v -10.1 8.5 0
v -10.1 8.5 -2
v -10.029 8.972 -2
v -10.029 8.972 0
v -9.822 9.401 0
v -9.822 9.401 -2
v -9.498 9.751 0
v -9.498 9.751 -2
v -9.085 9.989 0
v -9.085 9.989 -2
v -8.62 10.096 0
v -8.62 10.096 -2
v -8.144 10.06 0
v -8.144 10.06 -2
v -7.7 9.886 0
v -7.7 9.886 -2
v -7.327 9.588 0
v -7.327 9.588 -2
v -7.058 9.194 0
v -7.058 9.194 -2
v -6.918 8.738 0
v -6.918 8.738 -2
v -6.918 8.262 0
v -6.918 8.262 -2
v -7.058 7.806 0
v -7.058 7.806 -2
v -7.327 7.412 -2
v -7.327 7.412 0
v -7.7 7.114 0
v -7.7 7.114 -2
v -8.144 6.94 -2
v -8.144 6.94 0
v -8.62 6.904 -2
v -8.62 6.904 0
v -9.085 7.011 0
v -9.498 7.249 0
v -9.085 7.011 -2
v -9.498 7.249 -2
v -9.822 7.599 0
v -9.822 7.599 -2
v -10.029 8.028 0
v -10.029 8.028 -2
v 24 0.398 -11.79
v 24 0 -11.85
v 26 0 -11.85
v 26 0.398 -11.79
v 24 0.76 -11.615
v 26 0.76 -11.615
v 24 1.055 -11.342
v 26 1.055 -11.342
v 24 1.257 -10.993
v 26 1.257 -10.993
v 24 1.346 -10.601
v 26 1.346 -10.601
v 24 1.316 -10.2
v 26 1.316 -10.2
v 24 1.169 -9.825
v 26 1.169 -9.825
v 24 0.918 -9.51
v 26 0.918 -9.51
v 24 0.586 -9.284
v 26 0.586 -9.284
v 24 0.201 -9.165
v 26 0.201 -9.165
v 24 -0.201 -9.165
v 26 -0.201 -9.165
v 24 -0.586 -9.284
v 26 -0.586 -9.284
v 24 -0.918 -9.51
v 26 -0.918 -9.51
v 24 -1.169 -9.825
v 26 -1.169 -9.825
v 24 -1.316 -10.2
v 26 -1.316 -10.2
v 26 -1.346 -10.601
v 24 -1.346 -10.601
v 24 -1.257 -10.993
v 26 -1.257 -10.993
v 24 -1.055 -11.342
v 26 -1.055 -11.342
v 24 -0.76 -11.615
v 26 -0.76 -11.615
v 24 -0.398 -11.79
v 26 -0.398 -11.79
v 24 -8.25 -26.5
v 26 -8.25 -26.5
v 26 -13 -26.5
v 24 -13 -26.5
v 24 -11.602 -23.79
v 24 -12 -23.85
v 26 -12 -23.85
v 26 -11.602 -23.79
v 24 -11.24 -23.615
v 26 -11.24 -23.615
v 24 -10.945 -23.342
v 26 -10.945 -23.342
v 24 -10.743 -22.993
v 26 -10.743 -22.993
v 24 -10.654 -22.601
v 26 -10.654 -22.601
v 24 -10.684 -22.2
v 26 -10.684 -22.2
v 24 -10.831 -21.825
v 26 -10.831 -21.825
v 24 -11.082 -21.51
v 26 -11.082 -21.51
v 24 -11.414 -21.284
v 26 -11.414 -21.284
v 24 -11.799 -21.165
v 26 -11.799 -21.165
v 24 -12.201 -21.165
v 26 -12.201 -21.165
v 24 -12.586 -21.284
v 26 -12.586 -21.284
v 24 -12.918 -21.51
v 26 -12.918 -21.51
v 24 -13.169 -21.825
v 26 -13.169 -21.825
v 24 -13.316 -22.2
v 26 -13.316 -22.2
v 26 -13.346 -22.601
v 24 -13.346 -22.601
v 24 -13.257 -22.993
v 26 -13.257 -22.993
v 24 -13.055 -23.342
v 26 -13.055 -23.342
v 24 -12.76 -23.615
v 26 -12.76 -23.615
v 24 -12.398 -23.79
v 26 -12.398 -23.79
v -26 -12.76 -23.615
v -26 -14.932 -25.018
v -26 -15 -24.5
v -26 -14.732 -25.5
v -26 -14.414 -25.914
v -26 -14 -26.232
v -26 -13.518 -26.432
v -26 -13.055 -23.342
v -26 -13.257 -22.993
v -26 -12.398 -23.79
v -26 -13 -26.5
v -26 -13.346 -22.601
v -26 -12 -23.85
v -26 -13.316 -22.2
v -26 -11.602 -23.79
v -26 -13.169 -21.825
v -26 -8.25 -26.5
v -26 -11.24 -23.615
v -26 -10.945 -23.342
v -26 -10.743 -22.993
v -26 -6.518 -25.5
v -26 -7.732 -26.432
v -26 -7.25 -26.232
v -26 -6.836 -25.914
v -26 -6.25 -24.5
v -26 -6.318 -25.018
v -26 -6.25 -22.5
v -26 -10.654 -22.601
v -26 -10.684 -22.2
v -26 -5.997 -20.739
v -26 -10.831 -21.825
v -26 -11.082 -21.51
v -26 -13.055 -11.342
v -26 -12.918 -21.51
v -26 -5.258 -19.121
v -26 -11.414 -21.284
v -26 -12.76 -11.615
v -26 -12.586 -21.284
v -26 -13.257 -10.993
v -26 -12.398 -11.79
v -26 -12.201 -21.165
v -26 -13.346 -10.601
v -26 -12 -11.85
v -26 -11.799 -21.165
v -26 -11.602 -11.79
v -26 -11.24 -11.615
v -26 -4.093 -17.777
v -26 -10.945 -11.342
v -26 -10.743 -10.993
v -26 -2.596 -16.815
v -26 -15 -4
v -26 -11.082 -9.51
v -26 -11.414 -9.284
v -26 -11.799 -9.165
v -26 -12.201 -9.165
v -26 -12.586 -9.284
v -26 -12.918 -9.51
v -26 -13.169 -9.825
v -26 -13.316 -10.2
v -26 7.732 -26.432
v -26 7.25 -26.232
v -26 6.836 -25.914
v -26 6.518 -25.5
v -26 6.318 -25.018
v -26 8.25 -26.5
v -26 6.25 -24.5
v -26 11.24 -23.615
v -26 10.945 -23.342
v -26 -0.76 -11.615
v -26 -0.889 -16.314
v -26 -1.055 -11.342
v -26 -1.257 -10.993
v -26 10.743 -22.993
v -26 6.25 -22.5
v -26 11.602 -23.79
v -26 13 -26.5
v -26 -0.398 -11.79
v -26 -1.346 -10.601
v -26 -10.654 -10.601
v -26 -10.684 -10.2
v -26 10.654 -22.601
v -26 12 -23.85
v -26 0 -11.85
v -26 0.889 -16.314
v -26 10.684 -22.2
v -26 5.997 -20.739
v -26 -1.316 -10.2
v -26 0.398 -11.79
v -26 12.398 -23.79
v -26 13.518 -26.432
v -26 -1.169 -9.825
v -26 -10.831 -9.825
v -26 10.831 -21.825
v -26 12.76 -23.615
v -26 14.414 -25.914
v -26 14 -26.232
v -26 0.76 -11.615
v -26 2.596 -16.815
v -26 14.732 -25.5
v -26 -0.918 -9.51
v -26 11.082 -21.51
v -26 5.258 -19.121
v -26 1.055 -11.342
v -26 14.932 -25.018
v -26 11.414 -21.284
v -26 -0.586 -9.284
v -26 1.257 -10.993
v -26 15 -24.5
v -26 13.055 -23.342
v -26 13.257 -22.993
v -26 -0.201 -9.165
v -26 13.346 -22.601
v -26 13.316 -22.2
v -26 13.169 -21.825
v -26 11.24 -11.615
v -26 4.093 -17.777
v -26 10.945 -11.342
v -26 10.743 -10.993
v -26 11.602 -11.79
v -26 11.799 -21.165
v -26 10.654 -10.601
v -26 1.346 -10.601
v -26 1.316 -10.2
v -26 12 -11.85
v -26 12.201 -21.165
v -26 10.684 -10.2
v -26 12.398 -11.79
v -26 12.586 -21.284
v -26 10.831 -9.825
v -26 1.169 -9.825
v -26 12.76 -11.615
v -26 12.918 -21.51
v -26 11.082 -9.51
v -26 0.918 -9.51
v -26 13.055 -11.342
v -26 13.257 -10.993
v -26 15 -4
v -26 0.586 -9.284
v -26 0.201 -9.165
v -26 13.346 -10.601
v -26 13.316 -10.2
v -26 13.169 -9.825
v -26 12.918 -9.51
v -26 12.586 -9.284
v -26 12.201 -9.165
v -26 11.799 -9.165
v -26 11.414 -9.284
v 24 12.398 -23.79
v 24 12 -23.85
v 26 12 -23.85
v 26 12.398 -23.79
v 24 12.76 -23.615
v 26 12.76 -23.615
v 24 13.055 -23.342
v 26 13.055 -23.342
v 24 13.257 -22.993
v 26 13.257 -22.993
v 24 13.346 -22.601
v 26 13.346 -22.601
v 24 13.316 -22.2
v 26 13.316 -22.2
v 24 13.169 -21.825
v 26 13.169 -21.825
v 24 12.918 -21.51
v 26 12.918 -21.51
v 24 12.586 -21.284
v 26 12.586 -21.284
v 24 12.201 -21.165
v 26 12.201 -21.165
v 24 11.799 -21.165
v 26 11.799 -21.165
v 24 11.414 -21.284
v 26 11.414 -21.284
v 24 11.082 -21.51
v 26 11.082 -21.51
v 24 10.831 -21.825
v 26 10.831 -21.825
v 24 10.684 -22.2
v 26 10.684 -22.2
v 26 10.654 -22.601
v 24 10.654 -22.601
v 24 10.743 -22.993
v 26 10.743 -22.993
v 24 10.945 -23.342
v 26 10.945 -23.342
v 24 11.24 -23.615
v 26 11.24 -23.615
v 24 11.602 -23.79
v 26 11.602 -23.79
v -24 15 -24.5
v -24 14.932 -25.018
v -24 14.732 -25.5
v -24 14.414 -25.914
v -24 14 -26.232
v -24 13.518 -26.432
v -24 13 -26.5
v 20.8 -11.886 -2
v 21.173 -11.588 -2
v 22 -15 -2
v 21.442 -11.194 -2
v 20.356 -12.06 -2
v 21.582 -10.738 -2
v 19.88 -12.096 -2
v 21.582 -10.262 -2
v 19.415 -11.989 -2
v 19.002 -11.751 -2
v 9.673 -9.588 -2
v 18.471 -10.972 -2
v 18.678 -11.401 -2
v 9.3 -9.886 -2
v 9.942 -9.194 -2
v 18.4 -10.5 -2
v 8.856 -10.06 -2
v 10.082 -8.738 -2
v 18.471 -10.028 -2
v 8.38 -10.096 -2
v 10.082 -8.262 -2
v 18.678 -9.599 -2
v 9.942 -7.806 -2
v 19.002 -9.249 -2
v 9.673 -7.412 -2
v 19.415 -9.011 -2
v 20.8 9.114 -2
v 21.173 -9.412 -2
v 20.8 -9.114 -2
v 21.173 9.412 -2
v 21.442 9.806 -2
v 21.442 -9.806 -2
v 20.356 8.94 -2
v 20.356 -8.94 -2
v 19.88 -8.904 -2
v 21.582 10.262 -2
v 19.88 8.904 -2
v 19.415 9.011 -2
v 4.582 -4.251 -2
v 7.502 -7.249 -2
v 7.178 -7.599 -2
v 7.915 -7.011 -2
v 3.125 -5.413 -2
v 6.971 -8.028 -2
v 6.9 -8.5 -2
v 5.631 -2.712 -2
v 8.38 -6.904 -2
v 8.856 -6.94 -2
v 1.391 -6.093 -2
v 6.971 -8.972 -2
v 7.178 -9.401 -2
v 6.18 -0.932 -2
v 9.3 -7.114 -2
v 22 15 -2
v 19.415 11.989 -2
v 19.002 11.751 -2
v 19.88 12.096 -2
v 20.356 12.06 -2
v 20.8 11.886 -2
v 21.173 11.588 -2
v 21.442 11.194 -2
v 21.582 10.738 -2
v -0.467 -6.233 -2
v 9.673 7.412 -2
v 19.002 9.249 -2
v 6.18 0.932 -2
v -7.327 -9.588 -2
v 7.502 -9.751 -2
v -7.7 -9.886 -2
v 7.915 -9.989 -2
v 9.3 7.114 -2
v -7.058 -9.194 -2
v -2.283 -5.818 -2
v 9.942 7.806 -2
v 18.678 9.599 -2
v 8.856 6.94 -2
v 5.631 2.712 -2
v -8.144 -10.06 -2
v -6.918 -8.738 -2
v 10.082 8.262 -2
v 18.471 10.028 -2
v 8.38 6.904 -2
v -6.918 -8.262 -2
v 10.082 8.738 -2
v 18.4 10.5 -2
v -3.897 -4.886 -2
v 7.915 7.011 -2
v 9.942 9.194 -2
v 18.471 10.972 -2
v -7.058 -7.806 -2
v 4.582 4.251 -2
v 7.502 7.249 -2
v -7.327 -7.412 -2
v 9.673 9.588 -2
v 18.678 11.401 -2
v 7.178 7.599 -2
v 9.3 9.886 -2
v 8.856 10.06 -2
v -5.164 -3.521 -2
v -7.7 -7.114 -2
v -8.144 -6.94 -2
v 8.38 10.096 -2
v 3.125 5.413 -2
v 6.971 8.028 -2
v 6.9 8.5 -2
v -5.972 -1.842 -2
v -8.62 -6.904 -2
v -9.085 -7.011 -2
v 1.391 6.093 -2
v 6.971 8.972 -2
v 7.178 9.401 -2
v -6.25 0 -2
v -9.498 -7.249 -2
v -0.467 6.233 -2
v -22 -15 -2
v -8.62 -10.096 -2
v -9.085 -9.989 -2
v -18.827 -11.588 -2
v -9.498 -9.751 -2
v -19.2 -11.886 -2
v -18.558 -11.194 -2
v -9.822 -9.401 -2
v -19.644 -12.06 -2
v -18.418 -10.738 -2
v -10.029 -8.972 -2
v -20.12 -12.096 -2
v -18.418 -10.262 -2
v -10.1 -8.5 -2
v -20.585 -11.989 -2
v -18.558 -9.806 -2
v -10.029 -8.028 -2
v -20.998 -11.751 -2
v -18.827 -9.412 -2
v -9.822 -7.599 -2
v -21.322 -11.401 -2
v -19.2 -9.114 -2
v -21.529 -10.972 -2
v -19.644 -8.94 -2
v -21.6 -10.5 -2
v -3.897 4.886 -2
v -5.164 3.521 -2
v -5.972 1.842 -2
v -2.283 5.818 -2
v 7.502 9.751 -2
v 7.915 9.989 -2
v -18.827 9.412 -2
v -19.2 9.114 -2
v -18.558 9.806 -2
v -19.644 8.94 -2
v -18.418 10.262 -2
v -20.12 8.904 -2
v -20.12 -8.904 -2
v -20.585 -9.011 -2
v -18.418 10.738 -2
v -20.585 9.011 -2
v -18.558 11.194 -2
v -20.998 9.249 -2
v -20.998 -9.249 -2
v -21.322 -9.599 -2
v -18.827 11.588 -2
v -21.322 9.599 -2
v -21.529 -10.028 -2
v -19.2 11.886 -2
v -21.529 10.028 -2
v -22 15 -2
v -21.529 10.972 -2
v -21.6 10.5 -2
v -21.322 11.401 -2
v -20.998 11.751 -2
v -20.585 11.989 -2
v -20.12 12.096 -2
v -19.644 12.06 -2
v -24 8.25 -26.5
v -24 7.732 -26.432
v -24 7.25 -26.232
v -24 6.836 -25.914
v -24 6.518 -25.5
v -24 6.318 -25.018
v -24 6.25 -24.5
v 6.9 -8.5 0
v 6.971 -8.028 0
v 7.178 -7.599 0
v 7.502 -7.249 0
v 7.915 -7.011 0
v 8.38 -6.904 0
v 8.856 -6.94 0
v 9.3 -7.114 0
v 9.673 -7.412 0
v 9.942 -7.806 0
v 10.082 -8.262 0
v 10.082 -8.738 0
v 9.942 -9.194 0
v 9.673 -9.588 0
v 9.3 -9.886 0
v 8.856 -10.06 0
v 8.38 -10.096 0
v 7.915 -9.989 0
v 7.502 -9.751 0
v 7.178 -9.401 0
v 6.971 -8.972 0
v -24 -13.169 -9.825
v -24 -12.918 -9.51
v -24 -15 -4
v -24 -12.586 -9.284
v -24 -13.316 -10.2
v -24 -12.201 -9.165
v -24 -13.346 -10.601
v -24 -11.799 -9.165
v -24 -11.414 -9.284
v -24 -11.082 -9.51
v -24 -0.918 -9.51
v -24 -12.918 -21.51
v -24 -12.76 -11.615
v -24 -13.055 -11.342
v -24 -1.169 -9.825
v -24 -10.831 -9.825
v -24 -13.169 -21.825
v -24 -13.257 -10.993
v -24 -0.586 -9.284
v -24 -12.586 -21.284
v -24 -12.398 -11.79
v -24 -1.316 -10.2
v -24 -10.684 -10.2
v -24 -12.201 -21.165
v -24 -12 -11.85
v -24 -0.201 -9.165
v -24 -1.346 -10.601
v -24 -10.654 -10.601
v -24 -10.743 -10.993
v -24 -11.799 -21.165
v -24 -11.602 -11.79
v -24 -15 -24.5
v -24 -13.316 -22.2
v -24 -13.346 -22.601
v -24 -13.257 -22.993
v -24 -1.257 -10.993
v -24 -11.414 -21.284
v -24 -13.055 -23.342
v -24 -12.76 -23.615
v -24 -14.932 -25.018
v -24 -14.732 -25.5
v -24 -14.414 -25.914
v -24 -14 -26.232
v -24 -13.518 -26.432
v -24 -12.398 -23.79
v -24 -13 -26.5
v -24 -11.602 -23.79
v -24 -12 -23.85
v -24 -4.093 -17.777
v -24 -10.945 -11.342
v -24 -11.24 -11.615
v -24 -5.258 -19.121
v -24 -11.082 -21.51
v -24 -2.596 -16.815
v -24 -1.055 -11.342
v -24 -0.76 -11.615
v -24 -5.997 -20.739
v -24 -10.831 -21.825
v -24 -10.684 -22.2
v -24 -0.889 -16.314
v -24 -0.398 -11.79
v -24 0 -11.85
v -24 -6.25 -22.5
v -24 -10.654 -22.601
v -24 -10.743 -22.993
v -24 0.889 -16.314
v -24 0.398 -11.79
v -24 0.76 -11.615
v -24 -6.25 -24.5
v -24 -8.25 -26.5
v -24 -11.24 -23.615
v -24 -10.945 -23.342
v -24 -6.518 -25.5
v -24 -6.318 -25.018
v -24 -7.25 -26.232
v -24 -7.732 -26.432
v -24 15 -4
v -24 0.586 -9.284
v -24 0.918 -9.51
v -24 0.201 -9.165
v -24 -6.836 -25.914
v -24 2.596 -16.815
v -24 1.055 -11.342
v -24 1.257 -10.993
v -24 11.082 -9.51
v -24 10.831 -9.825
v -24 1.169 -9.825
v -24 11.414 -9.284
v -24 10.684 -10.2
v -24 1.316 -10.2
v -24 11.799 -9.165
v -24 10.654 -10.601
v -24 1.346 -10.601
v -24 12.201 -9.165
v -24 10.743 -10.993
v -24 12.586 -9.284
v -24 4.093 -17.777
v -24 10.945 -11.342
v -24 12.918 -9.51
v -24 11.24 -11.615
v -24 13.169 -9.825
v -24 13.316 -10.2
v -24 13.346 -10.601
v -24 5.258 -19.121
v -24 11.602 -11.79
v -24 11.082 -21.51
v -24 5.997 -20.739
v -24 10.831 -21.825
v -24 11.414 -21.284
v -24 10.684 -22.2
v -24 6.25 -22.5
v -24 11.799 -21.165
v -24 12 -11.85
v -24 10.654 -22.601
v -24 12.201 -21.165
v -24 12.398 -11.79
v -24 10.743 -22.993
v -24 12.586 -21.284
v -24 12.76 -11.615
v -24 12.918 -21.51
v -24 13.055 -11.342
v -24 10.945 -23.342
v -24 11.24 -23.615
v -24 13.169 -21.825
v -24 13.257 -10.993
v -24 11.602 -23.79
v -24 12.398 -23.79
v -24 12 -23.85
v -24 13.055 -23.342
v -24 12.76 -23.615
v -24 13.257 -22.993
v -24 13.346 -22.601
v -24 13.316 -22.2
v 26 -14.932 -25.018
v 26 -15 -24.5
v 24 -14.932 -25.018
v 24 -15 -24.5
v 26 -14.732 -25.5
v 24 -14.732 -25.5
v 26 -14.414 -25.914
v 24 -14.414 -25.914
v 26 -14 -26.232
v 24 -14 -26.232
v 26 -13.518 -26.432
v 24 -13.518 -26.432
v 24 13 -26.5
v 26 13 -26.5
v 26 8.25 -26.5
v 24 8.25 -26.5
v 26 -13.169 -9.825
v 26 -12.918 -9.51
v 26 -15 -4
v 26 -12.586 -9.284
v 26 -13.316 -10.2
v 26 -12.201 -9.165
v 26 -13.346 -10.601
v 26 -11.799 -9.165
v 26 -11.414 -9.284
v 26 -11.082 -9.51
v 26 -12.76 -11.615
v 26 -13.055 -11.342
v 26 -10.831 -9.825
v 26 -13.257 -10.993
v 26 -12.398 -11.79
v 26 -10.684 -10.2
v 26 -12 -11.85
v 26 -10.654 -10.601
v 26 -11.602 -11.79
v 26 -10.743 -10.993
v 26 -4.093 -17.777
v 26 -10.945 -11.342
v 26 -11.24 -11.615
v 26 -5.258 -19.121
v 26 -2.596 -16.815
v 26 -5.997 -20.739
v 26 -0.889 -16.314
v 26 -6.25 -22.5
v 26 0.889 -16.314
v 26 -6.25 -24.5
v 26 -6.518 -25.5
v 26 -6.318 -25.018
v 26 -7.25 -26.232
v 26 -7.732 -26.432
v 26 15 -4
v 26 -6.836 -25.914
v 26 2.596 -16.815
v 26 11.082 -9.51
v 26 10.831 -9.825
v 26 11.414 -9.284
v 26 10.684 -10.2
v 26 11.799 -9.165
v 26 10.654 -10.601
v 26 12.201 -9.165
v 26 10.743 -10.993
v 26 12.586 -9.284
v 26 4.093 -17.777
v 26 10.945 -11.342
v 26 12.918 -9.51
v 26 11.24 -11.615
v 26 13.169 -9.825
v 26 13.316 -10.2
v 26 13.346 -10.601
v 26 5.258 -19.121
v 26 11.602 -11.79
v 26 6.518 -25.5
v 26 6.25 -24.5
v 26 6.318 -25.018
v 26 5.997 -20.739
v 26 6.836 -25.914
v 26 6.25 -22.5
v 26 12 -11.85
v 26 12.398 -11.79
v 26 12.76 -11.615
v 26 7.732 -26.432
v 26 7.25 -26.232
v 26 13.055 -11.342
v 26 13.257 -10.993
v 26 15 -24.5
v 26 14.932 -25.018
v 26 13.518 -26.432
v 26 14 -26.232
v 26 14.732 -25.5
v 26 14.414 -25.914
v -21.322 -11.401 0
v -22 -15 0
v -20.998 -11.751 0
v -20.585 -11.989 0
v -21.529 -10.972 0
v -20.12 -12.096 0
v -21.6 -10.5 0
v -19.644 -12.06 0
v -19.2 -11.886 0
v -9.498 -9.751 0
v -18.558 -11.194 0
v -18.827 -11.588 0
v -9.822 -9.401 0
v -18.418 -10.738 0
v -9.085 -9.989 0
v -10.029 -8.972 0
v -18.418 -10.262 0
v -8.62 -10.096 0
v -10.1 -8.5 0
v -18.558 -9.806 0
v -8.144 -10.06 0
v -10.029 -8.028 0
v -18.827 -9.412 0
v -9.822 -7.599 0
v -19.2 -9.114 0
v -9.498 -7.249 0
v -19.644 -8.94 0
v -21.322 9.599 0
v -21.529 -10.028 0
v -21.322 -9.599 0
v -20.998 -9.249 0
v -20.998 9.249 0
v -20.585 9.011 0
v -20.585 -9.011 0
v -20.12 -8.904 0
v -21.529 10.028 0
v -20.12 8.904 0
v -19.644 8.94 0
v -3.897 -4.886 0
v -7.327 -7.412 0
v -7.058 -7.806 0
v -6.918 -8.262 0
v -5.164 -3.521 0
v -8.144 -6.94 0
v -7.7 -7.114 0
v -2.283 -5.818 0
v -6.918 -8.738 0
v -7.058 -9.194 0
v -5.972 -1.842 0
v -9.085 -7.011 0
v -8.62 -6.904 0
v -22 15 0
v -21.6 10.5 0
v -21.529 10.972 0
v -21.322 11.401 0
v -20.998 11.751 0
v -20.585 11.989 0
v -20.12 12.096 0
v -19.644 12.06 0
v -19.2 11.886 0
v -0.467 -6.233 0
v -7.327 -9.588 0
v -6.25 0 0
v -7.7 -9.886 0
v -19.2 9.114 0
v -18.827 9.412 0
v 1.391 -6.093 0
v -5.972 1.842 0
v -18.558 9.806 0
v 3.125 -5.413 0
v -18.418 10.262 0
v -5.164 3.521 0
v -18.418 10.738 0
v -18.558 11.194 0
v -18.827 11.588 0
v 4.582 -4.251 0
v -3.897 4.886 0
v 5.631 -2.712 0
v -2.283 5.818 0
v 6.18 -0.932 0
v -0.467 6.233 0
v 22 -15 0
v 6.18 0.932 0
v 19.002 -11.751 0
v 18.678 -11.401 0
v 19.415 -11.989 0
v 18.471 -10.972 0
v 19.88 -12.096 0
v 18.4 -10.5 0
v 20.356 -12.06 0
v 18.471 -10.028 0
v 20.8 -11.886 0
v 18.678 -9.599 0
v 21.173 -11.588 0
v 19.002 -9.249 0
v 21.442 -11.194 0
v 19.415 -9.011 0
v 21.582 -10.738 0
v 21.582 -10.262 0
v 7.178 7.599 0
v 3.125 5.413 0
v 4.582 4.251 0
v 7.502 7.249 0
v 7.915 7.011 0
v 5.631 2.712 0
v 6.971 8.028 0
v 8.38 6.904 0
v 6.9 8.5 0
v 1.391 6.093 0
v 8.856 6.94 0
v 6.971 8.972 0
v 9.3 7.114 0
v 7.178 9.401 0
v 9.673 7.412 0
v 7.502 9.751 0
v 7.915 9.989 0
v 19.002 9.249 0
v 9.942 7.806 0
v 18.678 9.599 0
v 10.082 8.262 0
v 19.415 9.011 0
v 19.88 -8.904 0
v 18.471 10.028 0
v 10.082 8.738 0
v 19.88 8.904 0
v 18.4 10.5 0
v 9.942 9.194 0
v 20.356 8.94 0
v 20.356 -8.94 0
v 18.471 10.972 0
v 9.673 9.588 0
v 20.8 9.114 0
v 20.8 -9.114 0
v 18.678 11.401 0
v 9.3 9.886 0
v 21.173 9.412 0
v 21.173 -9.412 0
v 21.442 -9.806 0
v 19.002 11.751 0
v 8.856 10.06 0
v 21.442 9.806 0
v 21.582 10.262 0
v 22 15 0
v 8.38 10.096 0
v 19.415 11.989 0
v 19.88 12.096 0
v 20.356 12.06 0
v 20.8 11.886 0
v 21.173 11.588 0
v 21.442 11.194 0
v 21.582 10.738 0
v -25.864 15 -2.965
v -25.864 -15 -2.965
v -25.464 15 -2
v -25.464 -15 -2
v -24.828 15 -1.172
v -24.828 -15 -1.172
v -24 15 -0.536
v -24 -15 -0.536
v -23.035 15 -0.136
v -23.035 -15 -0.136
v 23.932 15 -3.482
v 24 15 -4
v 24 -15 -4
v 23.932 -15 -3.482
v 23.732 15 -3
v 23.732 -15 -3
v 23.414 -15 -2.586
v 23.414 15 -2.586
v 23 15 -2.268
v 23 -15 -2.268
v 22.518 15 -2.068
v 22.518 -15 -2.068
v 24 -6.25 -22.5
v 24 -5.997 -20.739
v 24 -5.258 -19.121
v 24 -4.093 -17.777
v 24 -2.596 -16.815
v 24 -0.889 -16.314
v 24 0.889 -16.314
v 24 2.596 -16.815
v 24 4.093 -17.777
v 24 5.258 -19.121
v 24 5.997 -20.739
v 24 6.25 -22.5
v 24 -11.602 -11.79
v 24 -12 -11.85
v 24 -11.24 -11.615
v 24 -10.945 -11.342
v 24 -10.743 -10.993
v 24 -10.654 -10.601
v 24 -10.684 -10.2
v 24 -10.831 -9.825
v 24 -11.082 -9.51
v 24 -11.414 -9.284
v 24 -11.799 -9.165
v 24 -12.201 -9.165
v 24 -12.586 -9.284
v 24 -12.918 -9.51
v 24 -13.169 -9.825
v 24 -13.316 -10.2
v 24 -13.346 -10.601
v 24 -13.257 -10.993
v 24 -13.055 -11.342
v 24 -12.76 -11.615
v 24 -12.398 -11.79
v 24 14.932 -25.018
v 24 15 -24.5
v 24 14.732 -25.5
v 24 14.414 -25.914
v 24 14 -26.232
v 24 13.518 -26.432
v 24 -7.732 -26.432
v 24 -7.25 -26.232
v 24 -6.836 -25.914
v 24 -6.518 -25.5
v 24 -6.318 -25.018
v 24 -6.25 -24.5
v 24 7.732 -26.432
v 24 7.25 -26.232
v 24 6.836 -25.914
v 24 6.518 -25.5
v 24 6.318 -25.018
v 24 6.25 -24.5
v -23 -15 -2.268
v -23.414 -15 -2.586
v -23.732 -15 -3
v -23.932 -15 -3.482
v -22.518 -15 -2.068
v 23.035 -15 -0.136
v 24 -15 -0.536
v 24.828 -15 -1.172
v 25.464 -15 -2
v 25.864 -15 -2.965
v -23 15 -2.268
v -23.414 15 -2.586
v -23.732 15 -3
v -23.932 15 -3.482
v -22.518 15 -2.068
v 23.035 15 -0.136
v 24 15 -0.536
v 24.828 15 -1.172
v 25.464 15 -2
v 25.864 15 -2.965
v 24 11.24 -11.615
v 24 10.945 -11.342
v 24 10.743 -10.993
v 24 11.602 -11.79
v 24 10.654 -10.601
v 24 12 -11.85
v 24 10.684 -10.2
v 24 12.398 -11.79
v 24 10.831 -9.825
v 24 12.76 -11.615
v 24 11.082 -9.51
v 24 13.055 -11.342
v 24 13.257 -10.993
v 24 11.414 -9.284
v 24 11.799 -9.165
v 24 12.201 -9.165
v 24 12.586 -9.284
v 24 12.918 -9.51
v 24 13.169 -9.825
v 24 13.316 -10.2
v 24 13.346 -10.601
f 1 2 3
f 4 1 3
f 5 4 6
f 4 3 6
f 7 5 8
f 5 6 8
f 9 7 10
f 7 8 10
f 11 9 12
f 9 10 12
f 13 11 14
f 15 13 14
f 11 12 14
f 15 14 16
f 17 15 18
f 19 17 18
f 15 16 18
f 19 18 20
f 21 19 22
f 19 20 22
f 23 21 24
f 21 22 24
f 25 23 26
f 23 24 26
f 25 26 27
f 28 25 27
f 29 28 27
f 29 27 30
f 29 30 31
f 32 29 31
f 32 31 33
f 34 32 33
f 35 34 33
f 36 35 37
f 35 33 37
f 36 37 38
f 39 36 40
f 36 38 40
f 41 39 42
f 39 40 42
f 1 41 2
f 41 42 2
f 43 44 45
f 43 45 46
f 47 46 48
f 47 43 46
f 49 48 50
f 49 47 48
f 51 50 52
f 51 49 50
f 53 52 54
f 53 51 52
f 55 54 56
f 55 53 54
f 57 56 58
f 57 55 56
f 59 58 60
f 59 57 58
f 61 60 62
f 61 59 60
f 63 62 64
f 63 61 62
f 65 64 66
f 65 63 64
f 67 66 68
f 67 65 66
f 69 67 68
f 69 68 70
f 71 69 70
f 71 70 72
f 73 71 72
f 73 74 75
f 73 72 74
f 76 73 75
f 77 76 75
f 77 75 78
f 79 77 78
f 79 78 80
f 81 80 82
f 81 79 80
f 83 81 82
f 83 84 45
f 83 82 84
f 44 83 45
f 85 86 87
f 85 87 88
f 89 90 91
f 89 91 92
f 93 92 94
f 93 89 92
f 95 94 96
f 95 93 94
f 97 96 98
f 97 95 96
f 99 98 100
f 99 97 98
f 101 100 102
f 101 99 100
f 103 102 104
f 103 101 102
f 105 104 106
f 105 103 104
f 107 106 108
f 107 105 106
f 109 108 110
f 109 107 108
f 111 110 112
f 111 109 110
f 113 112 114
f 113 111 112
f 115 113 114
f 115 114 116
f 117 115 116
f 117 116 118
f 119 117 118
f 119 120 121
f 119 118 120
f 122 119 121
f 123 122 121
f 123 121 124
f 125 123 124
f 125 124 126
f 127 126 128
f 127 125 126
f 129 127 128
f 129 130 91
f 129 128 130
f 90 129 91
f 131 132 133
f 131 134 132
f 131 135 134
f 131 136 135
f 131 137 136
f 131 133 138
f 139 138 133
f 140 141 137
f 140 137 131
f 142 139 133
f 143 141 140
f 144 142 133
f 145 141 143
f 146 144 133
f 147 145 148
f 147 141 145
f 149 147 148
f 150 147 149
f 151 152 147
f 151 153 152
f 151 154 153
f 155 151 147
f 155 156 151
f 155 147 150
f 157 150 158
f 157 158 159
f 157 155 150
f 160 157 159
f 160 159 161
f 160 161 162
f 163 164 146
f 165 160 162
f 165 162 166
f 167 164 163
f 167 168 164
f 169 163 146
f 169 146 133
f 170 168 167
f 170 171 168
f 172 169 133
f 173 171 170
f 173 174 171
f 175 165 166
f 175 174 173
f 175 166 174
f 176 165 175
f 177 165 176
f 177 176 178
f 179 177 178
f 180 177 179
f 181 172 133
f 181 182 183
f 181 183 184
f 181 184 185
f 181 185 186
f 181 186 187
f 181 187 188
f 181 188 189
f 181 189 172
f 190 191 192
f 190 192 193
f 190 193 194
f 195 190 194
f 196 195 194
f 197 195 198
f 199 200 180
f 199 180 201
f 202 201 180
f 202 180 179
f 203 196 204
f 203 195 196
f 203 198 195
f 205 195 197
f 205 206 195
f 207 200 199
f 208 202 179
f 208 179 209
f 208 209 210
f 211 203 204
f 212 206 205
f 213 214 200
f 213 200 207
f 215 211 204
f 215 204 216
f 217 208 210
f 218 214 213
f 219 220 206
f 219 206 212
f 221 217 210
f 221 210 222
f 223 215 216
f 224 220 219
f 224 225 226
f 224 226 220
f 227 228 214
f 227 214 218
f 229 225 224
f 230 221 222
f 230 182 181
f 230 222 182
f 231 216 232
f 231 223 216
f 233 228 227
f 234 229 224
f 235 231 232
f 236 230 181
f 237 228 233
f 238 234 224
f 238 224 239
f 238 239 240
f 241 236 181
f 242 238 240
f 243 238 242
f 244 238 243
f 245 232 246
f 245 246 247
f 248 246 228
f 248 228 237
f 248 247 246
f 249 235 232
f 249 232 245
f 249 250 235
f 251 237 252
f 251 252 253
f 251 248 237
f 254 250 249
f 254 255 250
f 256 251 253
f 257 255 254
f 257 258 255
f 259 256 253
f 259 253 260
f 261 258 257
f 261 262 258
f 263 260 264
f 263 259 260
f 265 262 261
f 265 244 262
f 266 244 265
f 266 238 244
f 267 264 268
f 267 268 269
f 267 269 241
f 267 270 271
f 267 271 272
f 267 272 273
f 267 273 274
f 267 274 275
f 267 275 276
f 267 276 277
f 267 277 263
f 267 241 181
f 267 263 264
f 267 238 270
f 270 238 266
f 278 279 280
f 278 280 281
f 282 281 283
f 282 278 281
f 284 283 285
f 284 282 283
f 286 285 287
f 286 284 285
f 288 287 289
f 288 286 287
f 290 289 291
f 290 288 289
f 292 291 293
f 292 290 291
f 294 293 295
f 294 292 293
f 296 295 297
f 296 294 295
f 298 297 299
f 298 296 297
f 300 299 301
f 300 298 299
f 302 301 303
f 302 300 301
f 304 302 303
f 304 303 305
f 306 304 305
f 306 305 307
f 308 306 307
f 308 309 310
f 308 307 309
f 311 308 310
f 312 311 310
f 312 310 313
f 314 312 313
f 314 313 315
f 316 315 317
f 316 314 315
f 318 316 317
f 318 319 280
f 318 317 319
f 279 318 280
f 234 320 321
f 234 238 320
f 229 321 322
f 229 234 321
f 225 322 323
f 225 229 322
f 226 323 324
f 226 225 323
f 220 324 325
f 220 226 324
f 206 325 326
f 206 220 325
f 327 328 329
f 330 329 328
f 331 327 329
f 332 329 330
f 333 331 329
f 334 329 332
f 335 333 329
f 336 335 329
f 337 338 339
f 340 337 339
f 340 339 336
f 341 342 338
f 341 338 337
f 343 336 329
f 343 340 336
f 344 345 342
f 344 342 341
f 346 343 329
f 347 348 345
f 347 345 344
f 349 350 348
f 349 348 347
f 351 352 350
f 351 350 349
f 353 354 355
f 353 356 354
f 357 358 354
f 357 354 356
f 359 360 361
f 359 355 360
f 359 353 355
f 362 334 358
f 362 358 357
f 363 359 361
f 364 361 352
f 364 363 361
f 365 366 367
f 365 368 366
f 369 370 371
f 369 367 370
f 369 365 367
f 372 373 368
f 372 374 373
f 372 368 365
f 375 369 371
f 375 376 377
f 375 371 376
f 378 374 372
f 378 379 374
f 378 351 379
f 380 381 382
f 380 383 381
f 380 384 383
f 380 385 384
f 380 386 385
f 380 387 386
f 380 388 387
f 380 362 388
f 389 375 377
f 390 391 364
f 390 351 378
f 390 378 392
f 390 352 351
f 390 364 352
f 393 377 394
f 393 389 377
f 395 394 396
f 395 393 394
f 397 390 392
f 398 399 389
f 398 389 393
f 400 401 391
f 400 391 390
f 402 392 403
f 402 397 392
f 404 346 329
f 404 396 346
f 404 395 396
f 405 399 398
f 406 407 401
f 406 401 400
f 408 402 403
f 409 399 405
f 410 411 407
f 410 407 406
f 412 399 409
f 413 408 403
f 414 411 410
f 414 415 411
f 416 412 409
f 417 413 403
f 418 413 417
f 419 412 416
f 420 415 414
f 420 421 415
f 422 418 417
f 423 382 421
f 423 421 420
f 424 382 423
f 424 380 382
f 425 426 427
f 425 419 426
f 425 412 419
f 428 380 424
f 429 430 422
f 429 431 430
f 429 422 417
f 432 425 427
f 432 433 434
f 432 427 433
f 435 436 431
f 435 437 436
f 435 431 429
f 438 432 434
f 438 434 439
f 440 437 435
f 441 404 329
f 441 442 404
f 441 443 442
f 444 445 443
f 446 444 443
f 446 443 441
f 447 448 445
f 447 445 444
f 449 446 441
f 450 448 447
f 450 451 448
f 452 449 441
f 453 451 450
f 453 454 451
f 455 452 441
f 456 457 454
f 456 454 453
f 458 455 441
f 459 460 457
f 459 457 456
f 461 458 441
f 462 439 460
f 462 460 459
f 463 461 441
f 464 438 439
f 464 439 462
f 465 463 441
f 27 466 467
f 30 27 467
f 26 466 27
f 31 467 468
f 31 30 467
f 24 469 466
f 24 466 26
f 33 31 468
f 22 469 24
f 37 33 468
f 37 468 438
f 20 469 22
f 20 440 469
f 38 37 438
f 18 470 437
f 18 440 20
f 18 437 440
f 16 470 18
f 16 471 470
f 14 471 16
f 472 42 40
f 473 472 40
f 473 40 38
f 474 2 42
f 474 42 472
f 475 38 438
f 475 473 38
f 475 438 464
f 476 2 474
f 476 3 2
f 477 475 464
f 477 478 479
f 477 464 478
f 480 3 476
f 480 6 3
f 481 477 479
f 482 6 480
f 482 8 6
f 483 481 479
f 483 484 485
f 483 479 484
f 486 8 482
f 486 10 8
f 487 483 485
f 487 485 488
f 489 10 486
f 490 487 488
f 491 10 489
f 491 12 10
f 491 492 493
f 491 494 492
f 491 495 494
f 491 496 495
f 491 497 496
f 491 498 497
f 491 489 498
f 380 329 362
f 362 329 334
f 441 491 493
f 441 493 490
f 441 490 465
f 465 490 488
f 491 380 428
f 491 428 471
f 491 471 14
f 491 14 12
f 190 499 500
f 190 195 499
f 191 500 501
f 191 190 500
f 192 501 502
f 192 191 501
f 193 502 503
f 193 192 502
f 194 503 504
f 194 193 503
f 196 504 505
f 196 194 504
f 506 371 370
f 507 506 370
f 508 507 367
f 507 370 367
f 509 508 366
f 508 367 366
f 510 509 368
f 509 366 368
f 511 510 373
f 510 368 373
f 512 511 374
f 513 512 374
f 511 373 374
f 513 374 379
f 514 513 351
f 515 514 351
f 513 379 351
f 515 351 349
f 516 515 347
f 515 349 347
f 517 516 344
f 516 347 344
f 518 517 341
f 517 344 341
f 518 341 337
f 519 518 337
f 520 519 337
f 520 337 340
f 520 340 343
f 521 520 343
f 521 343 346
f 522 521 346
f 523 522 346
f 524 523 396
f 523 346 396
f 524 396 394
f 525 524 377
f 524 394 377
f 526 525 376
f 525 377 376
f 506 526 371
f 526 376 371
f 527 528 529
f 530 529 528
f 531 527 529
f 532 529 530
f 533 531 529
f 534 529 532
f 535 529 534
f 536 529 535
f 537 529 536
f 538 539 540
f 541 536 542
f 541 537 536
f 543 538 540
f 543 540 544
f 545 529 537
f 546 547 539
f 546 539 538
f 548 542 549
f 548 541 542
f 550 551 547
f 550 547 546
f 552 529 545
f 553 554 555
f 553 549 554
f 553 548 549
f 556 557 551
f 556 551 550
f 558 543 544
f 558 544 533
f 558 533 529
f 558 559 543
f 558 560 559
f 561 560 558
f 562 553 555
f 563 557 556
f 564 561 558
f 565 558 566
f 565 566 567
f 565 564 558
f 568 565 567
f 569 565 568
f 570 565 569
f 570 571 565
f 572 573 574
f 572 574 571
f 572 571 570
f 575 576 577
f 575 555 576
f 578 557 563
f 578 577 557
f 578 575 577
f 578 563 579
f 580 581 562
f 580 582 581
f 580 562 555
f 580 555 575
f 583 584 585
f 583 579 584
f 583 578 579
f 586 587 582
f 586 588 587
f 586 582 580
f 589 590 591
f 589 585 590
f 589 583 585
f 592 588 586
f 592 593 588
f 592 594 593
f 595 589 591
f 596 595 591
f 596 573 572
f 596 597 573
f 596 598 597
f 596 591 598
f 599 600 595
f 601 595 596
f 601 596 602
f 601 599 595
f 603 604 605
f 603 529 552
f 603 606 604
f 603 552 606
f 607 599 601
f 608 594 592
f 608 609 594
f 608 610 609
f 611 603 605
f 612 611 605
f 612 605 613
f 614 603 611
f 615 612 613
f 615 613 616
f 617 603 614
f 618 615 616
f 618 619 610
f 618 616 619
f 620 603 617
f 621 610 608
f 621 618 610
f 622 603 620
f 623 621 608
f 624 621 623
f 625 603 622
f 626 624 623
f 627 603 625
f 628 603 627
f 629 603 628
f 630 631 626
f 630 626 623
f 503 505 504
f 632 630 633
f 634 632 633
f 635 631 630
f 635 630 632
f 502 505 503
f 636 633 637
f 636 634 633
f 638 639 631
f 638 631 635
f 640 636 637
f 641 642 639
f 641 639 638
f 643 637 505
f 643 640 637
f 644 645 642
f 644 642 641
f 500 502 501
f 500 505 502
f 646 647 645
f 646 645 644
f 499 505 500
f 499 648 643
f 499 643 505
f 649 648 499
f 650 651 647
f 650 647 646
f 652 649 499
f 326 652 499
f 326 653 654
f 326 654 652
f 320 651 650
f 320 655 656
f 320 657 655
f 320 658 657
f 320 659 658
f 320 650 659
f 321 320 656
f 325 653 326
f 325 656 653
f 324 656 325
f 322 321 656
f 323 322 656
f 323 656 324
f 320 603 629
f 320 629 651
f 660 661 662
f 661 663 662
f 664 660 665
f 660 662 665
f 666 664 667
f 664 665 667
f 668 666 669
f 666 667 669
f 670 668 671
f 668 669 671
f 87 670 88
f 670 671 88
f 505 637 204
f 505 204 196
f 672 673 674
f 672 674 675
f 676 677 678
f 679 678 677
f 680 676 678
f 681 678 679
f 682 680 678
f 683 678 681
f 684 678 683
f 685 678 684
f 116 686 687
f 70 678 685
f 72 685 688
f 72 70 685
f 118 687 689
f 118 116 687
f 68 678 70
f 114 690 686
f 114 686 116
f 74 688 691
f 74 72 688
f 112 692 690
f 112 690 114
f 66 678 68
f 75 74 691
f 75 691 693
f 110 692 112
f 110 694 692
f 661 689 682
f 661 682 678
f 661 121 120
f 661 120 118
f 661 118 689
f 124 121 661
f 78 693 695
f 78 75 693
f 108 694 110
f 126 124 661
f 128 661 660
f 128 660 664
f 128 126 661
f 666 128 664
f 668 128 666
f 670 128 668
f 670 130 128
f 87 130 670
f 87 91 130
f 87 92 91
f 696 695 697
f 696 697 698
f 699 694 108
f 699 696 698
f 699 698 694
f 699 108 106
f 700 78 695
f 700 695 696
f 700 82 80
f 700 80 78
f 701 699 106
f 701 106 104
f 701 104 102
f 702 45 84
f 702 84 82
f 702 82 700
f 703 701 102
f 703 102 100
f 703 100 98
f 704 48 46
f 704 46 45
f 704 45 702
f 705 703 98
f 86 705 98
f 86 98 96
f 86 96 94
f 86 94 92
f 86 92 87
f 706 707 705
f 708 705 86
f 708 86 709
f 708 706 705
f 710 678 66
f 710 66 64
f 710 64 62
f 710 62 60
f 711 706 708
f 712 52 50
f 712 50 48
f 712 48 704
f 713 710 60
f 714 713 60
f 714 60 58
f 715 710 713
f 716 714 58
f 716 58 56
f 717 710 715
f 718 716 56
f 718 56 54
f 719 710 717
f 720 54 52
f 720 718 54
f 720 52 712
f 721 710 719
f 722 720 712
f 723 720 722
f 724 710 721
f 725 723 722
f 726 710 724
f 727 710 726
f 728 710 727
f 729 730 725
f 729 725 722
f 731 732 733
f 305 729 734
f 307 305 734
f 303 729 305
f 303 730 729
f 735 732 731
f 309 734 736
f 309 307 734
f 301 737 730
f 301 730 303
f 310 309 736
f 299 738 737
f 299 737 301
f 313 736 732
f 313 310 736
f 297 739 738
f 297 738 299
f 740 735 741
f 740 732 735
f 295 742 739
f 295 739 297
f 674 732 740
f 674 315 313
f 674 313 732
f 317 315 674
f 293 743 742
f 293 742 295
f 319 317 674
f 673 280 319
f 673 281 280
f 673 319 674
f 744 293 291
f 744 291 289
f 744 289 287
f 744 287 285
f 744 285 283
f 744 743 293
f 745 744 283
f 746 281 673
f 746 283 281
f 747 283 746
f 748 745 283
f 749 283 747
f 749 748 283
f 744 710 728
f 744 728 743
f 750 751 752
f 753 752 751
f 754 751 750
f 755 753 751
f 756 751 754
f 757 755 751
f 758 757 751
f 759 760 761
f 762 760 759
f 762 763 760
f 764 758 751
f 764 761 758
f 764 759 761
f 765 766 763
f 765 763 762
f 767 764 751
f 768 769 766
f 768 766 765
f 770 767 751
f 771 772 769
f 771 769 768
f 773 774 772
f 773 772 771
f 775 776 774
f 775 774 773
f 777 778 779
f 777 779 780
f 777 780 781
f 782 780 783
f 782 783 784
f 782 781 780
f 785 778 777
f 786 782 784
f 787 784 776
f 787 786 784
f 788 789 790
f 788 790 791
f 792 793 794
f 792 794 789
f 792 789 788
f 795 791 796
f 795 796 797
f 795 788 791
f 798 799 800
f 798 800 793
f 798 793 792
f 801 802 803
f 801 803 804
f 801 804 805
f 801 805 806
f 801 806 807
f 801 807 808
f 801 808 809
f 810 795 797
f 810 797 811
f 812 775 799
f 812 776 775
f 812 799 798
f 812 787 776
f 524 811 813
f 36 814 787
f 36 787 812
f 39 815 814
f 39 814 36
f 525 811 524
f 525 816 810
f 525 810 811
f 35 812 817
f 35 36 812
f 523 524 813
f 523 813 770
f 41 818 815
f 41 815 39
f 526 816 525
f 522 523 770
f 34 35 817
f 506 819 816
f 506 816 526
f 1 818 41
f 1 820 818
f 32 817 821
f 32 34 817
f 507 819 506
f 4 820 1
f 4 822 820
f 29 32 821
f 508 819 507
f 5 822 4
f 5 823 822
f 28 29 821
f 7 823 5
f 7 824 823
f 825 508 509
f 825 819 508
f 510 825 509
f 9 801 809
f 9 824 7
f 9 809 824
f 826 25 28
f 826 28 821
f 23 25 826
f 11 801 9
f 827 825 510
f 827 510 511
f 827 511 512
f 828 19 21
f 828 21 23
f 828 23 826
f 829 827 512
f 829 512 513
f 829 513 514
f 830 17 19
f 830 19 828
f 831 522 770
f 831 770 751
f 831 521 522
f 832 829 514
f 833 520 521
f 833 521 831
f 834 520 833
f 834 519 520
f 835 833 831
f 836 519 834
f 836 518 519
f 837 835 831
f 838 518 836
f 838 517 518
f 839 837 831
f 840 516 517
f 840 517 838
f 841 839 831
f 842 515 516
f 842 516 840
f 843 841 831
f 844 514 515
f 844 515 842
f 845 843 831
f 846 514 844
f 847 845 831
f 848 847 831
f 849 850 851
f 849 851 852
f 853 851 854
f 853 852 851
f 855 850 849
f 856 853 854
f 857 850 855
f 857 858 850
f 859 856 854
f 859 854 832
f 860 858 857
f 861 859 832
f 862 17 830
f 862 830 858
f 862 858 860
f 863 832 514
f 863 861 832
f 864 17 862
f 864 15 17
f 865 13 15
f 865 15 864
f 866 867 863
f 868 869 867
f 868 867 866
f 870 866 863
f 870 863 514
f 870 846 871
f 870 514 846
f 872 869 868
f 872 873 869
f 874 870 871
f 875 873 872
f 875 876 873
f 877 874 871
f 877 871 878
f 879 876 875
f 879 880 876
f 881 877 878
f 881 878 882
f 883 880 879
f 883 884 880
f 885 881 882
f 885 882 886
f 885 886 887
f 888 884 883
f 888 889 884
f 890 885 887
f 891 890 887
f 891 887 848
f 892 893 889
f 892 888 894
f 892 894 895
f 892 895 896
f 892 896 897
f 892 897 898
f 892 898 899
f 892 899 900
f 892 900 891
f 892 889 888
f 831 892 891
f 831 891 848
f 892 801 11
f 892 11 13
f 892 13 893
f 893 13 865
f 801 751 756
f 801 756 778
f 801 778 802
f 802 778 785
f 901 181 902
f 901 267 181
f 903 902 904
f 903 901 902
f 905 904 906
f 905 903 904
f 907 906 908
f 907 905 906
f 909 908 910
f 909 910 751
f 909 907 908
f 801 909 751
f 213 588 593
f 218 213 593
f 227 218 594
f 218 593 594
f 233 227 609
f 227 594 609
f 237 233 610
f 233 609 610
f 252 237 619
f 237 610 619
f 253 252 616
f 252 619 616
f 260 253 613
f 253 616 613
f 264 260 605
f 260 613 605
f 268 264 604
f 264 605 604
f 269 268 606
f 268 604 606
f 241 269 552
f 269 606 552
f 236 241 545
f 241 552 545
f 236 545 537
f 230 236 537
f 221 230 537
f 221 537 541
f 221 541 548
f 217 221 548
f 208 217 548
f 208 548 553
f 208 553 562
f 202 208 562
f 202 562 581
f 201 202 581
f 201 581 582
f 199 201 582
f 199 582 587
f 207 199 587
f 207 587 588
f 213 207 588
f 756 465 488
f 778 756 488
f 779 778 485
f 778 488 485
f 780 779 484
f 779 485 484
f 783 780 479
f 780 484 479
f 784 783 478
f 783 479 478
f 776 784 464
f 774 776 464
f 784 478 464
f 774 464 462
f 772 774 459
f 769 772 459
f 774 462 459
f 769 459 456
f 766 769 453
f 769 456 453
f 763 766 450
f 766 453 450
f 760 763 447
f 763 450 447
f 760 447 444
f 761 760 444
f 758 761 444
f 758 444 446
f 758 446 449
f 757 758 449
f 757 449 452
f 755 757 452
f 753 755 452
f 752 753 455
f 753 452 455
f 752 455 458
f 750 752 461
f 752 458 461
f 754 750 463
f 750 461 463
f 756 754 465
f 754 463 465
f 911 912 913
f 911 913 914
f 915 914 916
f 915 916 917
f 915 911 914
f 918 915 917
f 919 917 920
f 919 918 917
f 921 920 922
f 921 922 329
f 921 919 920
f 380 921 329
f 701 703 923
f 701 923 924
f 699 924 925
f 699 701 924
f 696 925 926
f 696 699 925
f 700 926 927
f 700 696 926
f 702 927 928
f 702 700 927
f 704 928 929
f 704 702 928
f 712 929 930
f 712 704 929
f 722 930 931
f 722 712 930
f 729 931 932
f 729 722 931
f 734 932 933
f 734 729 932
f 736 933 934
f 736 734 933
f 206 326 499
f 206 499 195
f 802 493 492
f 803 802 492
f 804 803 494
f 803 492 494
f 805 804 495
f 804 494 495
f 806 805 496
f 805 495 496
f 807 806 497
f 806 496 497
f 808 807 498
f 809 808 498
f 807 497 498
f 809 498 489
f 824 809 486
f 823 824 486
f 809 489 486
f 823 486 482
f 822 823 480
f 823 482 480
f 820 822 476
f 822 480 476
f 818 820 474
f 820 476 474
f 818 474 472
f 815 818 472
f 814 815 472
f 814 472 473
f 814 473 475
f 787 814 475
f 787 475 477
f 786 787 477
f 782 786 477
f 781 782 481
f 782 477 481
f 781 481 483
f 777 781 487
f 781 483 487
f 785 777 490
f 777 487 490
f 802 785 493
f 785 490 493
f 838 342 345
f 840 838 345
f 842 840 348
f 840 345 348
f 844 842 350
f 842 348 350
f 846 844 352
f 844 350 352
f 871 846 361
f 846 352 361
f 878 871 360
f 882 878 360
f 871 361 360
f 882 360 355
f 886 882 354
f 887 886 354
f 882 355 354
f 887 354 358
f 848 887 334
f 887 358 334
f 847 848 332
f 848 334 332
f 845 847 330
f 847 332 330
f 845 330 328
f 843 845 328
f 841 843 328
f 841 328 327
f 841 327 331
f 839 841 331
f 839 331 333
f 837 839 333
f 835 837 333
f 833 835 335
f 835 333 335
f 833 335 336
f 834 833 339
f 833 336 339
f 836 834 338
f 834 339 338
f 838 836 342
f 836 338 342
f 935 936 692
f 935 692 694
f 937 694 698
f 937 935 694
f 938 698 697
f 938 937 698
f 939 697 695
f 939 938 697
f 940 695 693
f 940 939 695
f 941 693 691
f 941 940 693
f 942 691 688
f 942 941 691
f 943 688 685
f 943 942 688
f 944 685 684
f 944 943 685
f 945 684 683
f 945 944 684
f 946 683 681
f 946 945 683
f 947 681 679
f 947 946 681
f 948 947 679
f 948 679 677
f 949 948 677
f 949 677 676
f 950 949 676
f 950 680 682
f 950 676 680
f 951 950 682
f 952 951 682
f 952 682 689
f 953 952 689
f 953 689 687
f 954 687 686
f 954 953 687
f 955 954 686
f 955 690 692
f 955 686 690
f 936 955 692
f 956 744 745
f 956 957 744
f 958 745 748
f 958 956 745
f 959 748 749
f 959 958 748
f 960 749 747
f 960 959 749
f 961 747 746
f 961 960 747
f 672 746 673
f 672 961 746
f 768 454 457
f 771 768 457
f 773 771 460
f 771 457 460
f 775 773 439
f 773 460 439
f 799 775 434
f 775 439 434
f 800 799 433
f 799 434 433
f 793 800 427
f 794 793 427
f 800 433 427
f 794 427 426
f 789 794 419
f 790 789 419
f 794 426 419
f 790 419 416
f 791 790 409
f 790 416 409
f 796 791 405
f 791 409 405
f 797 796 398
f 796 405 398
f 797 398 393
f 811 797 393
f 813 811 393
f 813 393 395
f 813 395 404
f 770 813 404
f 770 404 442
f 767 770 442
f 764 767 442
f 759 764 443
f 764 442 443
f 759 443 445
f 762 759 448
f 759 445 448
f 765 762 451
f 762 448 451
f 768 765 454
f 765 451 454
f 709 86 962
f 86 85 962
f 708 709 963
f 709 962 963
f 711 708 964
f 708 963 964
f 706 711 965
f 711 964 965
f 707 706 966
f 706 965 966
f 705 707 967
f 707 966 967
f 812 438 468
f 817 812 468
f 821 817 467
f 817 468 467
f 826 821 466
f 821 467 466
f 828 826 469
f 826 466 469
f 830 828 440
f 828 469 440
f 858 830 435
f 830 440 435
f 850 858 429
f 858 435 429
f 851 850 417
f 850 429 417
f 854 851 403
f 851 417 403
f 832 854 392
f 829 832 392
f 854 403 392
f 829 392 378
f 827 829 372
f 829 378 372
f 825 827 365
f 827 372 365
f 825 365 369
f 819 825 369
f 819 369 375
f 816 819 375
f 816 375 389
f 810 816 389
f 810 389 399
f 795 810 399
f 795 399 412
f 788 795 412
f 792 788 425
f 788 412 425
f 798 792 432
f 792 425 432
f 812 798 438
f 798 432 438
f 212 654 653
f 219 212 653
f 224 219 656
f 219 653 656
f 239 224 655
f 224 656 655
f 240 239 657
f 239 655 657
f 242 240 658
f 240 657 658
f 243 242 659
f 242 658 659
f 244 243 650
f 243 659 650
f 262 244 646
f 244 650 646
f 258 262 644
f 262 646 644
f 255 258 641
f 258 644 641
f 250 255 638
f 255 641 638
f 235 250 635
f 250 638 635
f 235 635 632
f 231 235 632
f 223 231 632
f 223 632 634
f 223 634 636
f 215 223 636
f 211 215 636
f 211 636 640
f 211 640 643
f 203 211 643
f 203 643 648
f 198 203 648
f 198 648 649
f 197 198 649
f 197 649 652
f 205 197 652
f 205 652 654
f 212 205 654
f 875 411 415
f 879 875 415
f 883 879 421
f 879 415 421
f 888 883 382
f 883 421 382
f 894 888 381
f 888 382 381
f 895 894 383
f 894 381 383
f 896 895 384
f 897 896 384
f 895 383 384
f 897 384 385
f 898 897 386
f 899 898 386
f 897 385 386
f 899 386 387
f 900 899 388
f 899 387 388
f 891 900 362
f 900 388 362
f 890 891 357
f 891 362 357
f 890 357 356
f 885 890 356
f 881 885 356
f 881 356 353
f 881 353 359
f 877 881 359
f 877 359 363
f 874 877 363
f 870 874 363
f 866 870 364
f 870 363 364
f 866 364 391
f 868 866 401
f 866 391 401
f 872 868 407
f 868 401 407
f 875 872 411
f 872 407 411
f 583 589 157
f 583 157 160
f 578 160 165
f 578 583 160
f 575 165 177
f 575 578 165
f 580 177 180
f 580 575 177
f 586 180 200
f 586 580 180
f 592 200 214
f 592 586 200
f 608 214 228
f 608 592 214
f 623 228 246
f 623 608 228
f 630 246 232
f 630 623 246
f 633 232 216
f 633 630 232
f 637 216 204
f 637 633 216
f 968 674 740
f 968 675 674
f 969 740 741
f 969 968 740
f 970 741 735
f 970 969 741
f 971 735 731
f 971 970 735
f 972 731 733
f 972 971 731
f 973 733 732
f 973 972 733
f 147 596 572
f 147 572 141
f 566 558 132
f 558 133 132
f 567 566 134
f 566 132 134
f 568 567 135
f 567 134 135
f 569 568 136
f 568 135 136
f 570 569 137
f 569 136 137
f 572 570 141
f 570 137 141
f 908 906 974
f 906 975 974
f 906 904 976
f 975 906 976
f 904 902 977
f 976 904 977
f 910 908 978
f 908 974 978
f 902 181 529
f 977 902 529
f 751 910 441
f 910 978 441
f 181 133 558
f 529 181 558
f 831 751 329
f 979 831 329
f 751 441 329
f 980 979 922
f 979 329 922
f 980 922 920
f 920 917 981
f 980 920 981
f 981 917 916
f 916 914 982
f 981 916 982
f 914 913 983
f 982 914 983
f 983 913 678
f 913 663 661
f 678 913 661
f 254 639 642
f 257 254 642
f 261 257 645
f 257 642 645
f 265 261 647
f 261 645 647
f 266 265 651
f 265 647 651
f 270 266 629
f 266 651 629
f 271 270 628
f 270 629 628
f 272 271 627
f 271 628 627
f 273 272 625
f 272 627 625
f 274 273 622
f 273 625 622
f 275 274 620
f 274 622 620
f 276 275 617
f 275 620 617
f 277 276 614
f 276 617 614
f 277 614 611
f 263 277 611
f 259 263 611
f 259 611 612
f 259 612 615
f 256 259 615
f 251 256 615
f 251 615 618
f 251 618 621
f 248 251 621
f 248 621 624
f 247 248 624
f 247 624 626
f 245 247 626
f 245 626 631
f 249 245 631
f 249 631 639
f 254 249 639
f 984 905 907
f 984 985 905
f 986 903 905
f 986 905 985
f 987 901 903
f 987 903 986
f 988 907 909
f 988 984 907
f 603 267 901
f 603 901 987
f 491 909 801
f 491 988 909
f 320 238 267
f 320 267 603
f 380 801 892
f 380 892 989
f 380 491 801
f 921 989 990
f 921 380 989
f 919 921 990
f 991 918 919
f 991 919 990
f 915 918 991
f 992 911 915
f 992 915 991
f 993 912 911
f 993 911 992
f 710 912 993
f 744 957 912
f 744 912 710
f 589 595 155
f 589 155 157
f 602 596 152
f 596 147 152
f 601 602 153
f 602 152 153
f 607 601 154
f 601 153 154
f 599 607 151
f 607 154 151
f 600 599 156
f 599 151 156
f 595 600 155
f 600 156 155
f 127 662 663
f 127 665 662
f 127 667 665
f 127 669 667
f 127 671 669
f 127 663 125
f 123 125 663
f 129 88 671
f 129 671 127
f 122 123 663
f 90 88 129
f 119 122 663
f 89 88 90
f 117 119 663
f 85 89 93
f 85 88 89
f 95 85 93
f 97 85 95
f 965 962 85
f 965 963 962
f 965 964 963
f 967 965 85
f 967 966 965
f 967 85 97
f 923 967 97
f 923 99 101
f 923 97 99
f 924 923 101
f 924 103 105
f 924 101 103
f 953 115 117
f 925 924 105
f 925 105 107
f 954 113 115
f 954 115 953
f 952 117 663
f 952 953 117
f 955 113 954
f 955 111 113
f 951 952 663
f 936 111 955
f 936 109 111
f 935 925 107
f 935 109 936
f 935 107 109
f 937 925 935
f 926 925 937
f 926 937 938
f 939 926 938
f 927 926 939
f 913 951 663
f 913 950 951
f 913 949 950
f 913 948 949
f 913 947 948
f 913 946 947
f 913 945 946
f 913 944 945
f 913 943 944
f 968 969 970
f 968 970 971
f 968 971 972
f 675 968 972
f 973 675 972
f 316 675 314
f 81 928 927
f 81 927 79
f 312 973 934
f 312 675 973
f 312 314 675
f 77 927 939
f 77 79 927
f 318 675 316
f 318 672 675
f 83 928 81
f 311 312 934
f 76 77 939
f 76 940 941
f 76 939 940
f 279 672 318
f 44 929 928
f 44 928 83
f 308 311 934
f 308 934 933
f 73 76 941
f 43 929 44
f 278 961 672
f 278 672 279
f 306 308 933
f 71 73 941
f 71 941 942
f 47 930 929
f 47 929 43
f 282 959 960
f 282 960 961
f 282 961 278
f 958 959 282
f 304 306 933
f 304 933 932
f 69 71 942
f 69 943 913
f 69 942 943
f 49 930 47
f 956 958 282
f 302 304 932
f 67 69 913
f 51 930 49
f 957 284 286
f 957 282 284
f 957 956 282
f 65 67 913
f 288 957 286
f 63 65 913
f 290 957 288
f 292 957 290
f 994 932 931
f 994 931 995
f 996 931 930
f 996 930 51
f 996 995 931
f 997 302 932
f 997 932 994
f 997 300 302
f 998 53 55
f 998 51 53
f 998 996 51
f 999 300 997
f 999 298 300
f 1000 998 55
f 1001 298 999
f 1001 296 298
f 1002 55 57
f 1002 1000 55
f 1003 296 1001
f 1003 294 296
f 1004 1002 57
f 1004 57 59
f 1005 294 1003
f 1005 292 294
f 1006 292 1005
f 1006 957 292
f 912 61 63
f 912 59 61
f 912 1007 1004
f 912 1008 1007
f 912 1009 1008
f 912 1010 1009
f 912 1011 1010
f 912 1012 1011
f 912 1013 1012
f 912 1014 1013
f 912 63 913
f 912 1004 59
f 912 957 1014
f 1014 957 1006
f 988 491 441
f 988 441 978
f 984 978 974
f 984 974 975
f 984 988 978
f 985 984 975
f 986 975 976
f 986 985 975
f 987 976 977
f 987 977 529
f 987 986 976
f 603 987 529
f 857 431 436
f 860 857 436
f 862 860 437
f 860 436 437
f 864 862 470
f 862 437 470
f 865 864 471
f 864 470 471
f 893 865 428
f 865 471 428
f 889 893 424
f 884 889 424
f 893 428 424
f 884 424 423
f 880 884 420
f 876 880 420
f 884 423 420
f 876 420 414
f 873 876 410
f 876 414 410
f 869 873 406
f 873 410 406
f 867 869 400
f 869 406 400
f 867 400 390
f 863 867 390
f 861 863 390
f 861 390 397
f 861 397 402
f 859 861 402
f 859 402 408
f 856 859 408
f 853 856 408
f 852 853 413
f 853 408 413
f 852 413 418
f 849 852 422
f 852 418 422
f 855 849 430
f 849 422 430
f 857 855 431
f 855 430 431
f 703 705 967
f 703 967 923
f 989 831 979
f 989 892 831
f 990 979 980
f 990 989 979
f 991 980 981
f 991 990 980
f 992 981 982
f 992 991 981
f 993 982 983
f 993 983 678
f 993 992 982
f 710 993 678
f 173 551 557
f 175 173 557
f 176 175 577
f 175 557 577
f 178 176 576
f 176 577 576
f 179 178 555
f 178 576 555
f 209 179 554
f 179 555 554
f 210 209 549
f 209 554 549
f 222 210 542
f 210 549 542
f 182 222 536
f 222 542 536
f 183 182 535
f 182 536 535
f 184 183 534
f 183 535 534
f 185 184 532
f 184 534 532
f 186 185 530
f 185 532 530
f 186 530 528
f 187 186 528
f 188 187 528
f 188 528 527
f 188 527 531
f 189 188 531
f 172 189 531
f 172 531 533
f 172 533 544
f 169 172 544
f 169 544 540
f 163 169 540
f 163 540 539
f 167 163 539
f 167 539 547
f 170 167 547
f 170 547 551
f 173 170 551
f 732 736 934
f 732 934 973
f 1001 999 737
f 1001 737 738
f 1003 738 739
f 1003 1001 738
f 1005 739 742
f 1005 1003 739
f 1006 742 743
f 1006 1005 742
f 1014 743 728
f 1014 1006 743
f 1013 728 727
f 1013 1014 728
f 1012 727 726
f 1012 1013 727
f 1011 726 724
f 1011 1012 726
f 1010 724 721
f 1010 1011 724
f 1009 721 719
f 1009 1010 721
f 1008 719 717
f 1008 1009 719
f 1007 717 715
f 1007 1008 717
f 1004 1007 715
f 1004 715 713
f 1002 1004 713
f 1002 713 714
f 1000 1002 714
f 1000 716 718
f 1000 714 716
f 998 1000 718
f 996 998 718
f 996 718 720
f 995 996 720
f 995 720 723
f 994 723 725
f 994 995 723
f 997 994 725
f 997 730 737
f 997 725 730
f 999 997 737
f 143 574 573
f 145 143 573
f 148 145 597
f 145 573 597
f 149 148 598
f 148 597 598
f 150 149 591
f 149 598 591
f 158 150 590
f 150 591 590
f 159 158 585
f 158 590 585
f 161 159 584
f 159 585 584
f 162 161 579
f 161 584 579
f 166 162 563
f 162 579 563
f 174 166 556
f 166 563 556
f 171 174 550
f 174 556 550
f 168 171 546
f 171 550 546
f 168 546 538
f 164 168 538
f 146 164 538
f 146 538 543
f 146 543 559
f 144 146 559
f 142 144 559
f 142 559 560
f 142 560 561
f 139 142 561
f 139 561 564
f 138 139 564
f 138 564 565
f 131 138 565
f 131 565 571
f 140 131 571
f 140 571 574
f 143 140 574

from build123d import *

# Parameters (mm, degrees)
EXTRUDE_1_DEPTH     = 15
SKETCH_2_R          = 1.6
SKETCH_2_R_2        = 6.25
CUT_EXTRUDE_1_DEPTH = 2
SKETCH_3_R          = 1.35
CUT_EXTRUDE_2_DEPTH = 31.5
FILLET_1_R          = 2


with BuildPart() as part:
    # 草图1 → 凸台-拉伸1 (new, symmetric)
    with BuildSketch(Plane(origin=(0, 0, 0), x_dir=(1, 0, 0), z_dir=(0, 1, 0))):
        with BuildLine():
            Line((0, 0), (22, 0))
            ThreePointArc((22, 0), (24.828427125, 1.171572875), (26, 4))
            Line((26, 4), (26, 26.5))
            Line((26, 26.5), (24, 26.5))
            Line((24, 26.5), (24, 4))
            ThreePointArc((24, 4), (23.414213562, 2.585786438), (22, 2))
            Line((22, 2), (0, 2))
            Line((0, 2), (-22, 2))
            ThreePointArc((-22, 2), (-23.414213562, 2.585786438), (-24, 4))
            Line((-24, 4), (-24, 26.5))
            Line((-24, 26.5), (-26, 26.5))
            Line((-26, 26.5), (-26, 4))
            ThreePointArc((-26, 4), (-24.828427125, 1.171572875), (-22, 0))
            Line((-22, 0), (0, 0))
        make_face()
    extrude(amount=EXTRUDE_1_DEPTH, both=True)

    # 草图2 → 切除-拉伸1 (cut)
    with BuildSketch(Plane(origin=(0, 0, -2), x_dir=(-1, 0, 0), z_dir=(0, 0, -1))):
        with Locations((20, 10.5)):
            Circle(SKETCH_2_R)
        with Locations((8.5, 8.5)):
            Circle(SKETCH_2_R)
        with Locations((-8.5, 8.5)):
            Circle(SKETCH_2_R)
        with Locations((-20, 10.5)):
            Circle(SKETCH_2_R)
        with Locations((-20, -10.5)):
            Circle(SKETCH_2_R)
        with Locations((8.5, -8.5)):
            Circle(SKETCH_2_R)
        with Locations((-8.5, -8.5)):
            Circle(SKETCH_2_R)
        with Locations((20, -10.5)):
            Circle(SKETCH_2_R)
        Circle(SKETCH_2_R_2)
    extrude(amount=-CUT_EXTRUDE_1_DEPTH, mode=Mode.SUBTRACT)

    # 草图3 → 切除-拉伸2 (cut, symmetric)
    with BuildSketch(Plane(origin=(0, 0, 0), x_dir=(0, 0, -1), z_dir=(1, 0, 0))):
        with Locations((10.5, 12)):
            Circle(SKETCH_3_R)
        with Locations((22.5, 12)):
            Circle(SKETCH_3_R)
        with Locations((10.5, 0)):
            Circle(SKETCH_3_R)
        with Locations((22.5, -12)):
            Circle(SKETCH_3_R)
        with Locations((10.5, -12)):
            Circle(SKETCH_3_R)
        with BuildLine():
            Line((22.5, 6.25), (26.5, 6.25))
            Line((26.5, 6.25), (26.5, -6.25))
            Line((26.5, -6.25), (22.5, -6.25))
            ThreePointArc((22.5, -6.25), (16.25, 0), (22.5, 6.25))
        make_face()
    extrude(amount=CUT_EXTRUDE_2_DEPTH, both=True, mode=Mode.SUBTRACT)

    # 圆角1
    fillet_1_edges = [part.edges().sort_by_distance(p)[0] for p in [
        (-25, 6.25, -26.5),
        (25, 6.25, -26.5),
        (-25, -6.25, -26.5),
        (25, -6.25, -26.5),
        (25, -15, -26.5),
        (-25, -15, -26.5),
        (-25, 15, -26.5),
        (25, 15, -26.5),
    ]]
    fillet(fillet_1_edges, radius=FILLET_1_R)


solid = part.part
